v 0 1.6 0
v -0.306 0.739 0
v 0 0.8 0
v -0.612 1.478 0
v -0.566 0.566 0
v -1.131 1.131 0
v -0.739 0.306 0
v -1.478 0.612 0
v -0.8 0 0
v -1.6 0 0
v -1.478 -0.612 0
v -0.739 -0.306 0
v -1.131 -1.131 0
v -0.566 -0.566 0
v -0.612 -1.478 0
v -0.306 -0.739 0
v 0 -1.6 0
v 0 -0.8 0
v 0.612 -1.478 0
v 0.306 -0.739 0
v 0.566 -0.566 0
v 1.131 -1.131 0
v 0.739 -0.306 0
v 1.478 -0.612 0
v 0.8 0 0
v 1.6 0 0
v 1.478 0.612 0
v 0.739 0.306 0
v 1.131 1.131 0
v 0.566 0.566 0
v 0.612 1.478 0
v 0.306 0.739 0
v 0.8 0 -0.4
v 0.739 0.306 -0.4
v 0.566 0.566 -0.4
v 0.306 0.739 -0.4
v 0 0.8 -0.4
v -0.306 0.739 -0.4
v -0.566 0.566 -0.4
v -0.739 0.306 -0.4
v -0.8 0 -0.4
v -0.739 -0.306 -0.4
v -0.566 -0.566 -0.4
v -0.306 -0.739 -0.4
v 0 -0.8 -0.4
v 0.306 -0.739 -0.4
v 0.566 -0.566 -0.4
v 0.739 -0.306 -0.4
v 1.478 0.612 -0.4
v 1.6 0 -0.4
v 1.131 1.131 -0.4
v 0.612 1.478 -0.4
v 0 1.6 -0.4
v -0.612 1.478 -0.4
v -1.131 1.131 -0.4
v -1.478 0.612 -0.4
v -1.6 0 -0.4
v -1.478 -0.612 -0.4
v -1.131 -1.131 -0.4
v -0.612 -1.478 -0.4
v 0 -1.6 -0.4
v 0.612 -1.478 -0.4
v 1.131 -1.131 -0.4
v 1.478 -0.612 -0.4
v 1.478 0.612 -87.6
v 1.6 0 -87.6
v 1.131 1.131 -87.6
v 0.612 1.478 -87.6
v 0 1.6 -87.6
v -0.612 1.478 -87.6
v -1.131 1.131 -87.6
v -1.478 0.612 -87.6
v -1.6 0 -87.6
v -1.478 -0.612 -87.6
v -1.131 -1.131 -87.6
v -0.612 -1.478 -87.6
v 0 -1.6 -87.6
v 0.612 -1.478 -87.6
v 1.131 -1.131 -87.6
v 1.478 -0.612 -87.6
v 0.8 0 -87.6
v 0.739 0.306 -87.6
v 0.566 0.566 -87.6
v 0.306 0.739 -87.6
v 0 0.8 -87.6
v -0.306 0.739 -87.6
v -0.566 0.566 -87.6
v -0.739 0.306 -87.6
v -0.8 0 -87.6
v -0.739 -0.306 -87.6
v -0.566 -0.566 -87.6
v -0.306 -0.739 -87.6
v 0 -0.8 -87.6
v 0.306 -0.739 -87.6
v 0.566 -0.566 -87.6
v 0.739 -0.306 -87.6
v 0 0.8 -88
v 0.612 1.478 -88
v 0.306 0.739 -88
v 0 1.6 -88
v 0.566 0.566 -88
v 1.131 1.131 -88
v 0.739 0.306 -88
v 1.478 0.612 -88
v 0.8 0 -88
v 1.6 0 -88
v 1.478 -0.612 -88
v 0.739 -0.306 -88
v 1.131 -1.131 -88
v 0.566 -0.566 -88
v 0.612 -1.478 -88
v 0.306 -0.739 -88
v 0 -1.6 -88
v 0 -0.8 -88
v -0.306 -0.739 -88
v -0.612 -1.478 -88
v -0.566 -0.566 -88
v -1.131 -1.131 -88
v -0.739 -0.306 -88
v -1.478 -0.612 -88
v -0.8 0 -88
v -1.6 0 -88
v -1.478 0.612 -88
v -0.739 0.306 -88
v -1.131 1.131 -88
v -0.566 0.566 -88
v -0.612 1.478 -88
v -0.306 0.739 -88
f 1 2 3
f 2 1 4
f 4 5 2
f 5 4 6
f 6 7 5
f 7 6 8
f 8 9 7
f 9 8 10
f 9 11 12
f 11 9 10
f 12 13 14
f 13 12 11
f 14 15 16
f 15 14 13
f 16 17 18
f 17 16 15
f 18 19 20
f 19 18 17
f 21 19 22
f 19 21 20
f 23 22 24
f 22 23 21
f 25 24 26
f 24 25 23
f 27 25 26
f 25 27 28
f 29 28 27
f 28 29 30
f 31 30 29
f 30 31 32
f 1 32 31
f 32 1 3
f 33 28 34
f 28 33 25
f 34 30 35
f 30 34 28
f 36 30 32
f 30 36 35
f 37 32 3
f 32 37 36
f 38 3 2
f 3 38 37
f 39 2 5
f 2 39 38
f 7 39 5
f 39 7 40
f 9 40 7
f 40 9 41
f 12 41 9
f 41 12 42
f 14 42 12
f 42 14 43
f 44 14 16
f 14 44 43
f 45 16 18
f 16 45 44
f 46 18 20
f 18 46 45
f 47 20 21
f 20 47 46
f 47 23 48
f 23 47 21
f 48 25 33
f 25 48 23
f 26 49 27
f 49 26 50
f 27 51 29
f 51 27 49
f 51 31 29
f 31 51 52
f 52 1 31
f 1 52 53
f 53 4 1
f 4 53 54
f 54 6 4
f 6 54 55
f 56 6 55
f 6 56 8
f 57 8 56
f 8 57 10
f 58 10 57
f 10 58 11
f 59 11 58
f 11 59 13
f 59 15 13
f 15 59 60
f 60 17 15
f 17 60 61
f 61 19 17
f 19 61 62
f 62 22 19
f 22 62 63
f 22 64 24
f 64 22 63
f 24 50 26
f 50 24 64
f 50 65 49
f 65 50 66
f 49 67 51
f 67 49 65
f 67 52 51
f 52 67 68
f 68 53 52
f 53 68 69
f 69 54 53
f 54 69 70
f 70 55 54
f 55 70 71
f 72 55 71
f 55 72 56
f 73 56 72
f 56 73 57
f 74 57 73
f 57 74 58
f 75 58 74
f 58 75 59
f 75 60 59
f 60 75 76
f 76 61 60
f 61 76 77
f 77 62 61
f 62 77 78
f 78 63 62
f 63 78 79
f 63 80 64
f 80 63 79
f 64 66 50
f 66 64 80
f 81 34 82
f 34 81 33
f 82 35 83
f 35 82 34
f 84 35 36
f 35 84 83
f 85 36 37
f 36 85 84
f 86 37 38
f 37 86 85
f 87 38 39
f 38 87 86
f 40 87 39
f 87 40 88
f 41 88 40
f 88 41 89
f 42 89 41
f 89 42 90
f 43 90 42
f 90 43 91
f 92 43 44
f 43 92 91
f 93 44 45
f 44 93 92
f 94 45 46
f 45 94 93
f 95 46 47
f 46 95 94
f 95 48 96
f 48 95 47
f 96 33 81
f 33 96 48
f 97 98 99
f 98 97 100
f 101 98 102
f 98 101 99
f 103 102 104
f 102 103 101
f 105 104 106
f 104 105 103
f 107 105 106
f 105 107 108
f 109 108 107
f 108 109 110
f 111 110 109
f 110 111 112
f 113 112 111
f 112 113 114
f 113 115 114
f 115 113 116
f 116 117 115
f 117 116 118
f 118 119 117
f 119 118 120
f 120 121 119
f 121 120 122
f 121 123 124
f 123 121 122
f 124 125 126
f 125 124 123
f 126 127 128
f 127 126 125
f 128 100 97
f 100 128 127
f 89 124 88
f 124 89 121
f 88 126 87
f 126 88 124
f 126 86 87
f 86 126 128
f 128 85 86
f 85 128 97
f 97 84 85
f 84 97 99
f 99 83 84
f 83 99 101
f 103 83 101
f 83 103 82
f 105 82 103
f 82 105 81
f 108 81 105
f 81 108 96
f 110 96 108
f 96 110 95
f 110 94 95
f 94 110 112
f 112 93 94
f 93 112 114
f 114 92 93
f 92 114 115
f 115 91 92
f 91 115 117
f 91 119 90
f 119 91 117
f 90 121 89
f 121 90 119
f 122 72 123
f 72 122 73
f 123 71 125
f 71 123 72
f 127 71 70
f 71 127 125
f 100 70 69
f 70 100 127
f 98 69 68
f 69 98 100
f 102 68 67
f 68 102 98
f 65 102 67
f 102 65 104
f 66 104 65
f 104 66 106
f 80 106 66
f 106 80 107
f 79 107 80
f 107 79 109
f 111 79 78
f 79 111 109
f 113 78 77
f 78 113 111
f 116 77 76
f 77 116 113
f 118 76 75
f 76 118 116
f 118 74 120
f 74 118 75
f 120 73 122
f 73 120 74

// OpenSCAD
// file: ../p/4-4ring1.scad
use <../lib.scad>
function ldraw_lib__4_4ring1() = [
// 0 Ring  1 x 1.0
// 0 Name: 4-4ring1.dat
// 0 Author: James Jessiman
// 0 !LDRAW_ORG Primitive UPDATE 2009-01
// 0 !LICENSE Licensed under CC BY 2.0 and CC BY 4.0 : see CAreadme.txt
// 
// 0 BFC CERTIFY CCW
  [0,"BFC","CERTIFY"],
  [0,"BFC","CCW"],
// 
// 0 !HISTORY 1998-12-15 [PTadmin] Official Update 1998-10
// 0 !HISTORY 2002-04-08 [BrickCaster] Modified for BFC compliance
// 0 !HISTORY 2002-04-25 [PTadmin] Official Update 2002-02
// 0 !HISTORY 2007-06-24 [PTadmin] Header formatted for Contributor Agreement
// 0 !HISTORY 2008-07-01 [PTadmin] Official Update 2008-01
// 0 !HISTORY 2008-08-26 [cwdee] Switch polygon winding and rename
// 0 !HISTORY 2009-05-02 [PTadmin] Official Update 2009-01
// 
// 
// 4 16 -0.7654 0 1.8478 -0.3827 0 0.9239 0 0 1 0 0 2
  [4,16,-0.7654,0,1.8478,-0.3827,0,0.9239,0,0,1,0,0,2],
// 4 16 -1.4142 0 1.4142 -0.7071 0 0.7071 -0.3827 0 0.9239 -0.7654 0 1.8478
  [4,16,-1.4142,0,1.4142,-0.7071,0,0.7071,-0.3827,0,0.9239,-0.7654,0,1.8478],
// 4 16 -1.8478 0 0.7654 -0.9239 0 0.3827 -0.7071 0 0.7071 -1.4142 0 1.41420
  [4,16,-1.8478,0,0.7654,-0.9239,0,0.3827,-0.7071,0,0.7071,-1.4142,0,1.41420],
// 4 16 -2 0 0 -1 0 0 -0.9239 0 0.3827 -1.8478 0 0.7654
  [4,16,-2,0,0,-1,0,0,-0.9239,0,0.3827,-1.8478,0,0.7654],
// 4 16 -1.8478 0 -0.7654 -0.9239 0 -0.3827 -1 0 0 -2 0 0
  [4,16,-1.8478,0,-0.7654,-0.9239,0,-0.3827,-1,0,0,-2,0,0],
// 4 16 -1.4142 0 -1.4142 -0.7071 0 -0.7071 -0.9239 0 -0.3827 -1.8478 0 -0.7654
  [4,16,-1.4142,0,-1.4142,-0.7071,0,-0.7071,-0.9239,0,-0.3827,-1.8478,0,-0.7654],
// 4 16 -0.7654 0 -1.8478 -0.3827 0 -0.9239 -0.7071 0 -0.7071 -1.4142 0 -1.4142
  [4,16,-0.7654,0,-1.8478,-0.3827,0,-0.9239,-0.7071,0,-0.7071,-1.4142,0,-1.4142],
// 4 16 0 0 -2 0 0 -1 -0.3827 0 -0.9239 -0.7654 0 -1.8478
  [4,16,0,0,-2,0,0,-1,-0.3827,0,-0.9239,-0.7654,0,-1.8478],
// 4 16 0.7654 0 -1.8478 0.3827 0 -0.9239 0 0 -1 0 0 -2
  [4,16,0.7654,0,-1.8478,0.3827,0,-0.9239,0,0,-1,0,0,-2],
// 4 16 1.4142 0 -1.4142 0.7071 0 -0.7071 0.3827 0 -0.9239 0.7654 0 -1.8478
  [4,16,1.4142,0,-1.4142,0.7071,0,-0.7071,0.3827,0,-0.9239,0.7654,0,-1.8478],
// 4 16 1.8478 0 -0.7654 0.9239 0 -0.3827 0.7071 0 -0.7071 1.4142 0 -1.4142
  [4,16,1.8478,0,-0.7654,0.9239,0,-0.3827,0.7071,0,-0.7071,1.4142,0,-1.4142],
// 4 16 2 0 0 1 0 0 0.9239 0 -0.3827 1.8478 0 -0.7654
  [4,16,2,0,0,1,0,0,0.9239,0,-0.3827,1.8478,0,-0.7654],
// 4 16 1.8478 0 0.7654 0.9239 0 0.3827 1 0 0 2 0 0
  [4,16,1.8478,0,0.7654,0.9239,0,0.3827,1,0,0,2,0,0],
// 4 16 1.4142 0 1.4142 0.7071 0 0.7071 0.9239 0 0.3827 1.8478 0 0.7654
  [4,16,1.4142,0,1.4142,0.7071,0,0.7071,0.9239,0,0.3827,1.8478,0,0.7654],
// 4 16 0.7654 0 1.8478 0.3827 0 0.9239 0.7071 0 0.7071 1.4142 0 1.4142
  [4,16,0.7654,0,1.8478,0.3827,0,0.9239,0.7071,0,0.7071,1.4142,0,1.4142],
// 4 16 0 0 2 0 0 1 0.3827 0 0.9239 0.7654 0 1.8478
  [4,16,0,0,2,0,0,1,0.3827,0,0.9239,0.7654,0,1.8478],
// 0
];
module ldraw_lib__4_4ring1(step=0, col=false, unit=2/5, alt=false, line=0.2, solid=!$preview)
    makepoly(ldraw_lib__4_4ring1(), step=step, col=col, unit=unit, alt=alt, line=line, solid=solid);
ldraw_lib__4_4ring1(line=0.2);
// file: ../p/4-4edge.scad
use <../lib.scad>
function ldraw_lib__4_4edge() = [
// 0 Circle 1.0
// 0 Name: 4-4edge.dat
// 0 Author: James Jessiman
// 0 !LDRAW_ORG Primitive UPDATE 2017-01
// 0 !LICENSE Licensed under CC BY 4.0 : see CAreadme.txt
// 
// 0 BFC CERTIFY CCW
  [0,"BFC","CERTIFY"],
  [0,"BFC","CCW"],
// 
// 0 !HISTORY 1998-12-15 [PTadmin] Official Update 1998-10
// 0 !HISTORY 2005-12-28 [PTadmin] Official Update 2005-01
// 0 !HISTORY 2007-06-24 [PTadmin] Header formatted for Contributor Agreement
// 0 !HISTORY 2008-07-01 [PTadmin] Official Update 2008-01
// 0 !HISTORY 2017-01-15 [Steffen] BFCed
// 0 !HISTORY 2017-12-30 [PTadmin] Official Update 2017-01
// 
// 
// 2 24 1 0 0 0.9239 0 0.3827
  [2,24,1,0,0,0.9239,0,0.3827],
// 2 24 0.9239 0 0.3827 0.7071 0 0.7071
  [2,24,0.9239,0,0.3827,0.7071,0,0.7071],
// 2 24 0.7071 0 0.7071 0.3827 0 0.9239
  [2,24,0.7071,0,0.7071,0.3827,0,0.9239],
// 2 24 0.3827 0 0.9239 0 0 1
  [2,24,0.3827,0,0.9239,0,0,1],
// 2 24 0 0 1 -0.3827 0 0.9239
  [2,24,0,0,1,-0.3827,0,0.9239],
// 2 24 -0.3827 0 0.9239 -0.7071 0 0.7071
  [2,24,-0.3827,0,0.9239,-0.7071,0,0.7071],
// 2 24 -0.7071 0 0.7071 -0.9239 0 0.3827
  [2,24,-0.7071,0,0.7071,-0.9239,0,0.3827],
// 2 24 -0.9239 0 0.3827 -1 0 -0
  [2,24,-0.9239,0,0.3827,-1,0,-0],
// 2 24 -1 0 -0 -0.9239 0 -0.3827
  [2,24,-1,0,-0,-0.9239,0,-0.3827],
// 2 24 -0.9239 0 -0.3827 -0.7071 0 -0.7071
  [2,24,-0.9239,0,-0.3827,-0.7071,0,-0.7071],
// 2 24 -0.7071 0 -0.7071 -0.3827 0 -0.9239
  [2,24,-0.7071,0,-0.7071,-0.3827,0,-0.9239],
// 2 24 -0.3827 0 -0.9239 0 0 -1
  [2,24,-0.3827,0,-0.9239,0,0,-1],
// 2 24 0 0 -1 0.3827 0 -0.9239
  [2,24,0,0,-1,0.3827,0,-0.9239],
// 2 24 0.3827 0 -0.9239 0.7071 0 -0.7071
  [2,24,0.3827,0,-0.9239,0.7071,0,-0.7071],
// 2 24 0.7071 0 -0.7071 0.9239 0 -0.3827
  [2,24,0.7071,0,-0.7071,0.9239,0,-0.3827],
// 2 24 0.9239 0 -0.3827 1 0 0
  [2,24,0.9239,0,-0.3827,1,0,0],
];
module ldraw_lib__4_4edge(step=0, col=false, unit=2/5, alt=false, line=0.2, solid=!$preview)
    makepoly(ldraw_lib__4_4edge(), step=step, col=col, unit=unit, alt=alt, line=line, solid=solid);
ldraw_lib__4_4edge(line=0.2);
// file: ../p/4-4cyli.scad
use <../lib.scad>
function ldraw_lib__4_4cyli() = [
// 0 Cylinder 1.0
// 0 Name: 4-4cyli.dat
// 0 Author: James Jessiman
// 0 !LDRAW_ORG Primitive UPDATE 2005-01
// 0 !LICENSE Licensed under CC BY 2.0 and CC BY 4.0 : see CAreadme.txt
// 
// 0 BFC CERTIFY CCW
  [0,"BFC","CERTIFY"],
  [0,"BFC","CCW"],
// 
// 0 !HISTORY 1998-12-15 [PTadmin] Official Update 1998-10
// 0 !HISTORY 2002-03-23 [sbliss] Added BFC statement; merged headers from files in distributions LDraw 0.27 and Complete.
// 0 !HISTORY 2002-04-25 [PTadmin] Official Update 2002-02
// 0 !HISTORY 2004-12-14 [guyvivan] BFC CCW
// 0 !HISTORY 2005-12-28 [PTadmin] Official Update 2005-01
// 0 !HISTORY 2007-06-24 [PTadmin] Header formatted for Contributor Agreement
// 0 !HISTORY 2008-07-01 [PTadmin] Official Update 2008-01
// 
// 
// 4 16 1 1 0 0.9239 1 0.3827 0.9239 0 0.3827 1 0 0
  [4,16,1,1,0,0.9239,1,0.3827,0.9239,0,0.3827,1,0,0],
// 5 24 1 0 0 1 1 0 0.9239 0 0.3827 0.9239 0 -0.3827
  [5,24,1,0,0,1,1,0,0.9239,0,0.3827,0.9239,0,-0.3827],
// 4 16 0.9239 1 0.3827 0.7071 1 0.7071 0.7071 0 0.7071 0.9239 0 0.3827
  [4,16,0.9239,1,0.3827,0.7071,1,0.7071,0.7071,0,0.7071,0.9239,0,0.3827],
// 5 24 0.9239 0 0.3827 0.9239 1 0.3827 0.7071 0 0.7071 1 0 0
  [5,24,0.9239,0,0.3827,0.9239,1,0.3827,0.7071,0,0.7071,1,0,0],
// 4 16 0.7071 1 0.7071 0.3827 1 0.9239 0.3827 0 0.9239 0.7071 0 0.7071
  [4,16,0.7071,1,0.7071,0.3827,1,0.9239,0.3827,0,0.9239,0.7071,0,0.7071],
// 5 24 0.7071 0 0.7071 0.7071 1 0.7071 0.3827 0 0.9239 0.9239 0 0.3827
  [5,24,0.7071,0,0.7071,0.7071,1,0.7071,0.3827,0,0.9239,0.9239,0,0.3827],
// 4 16 0.3827 1 0.9239 0 1 1 0 0 1 0.3827 0 0.9239
  [4,16,0.3827,1,0.9239,0,1,1,0,0,1,0.3827,0,0.9239],
// 5 24 0.3827 0 0.9239 0.3827 1 0.9239 0 0 1 0.7071 0 0.7071
  [5,24,0.3827,0,0.9239,0.3827,1,0.9239,0,0,1,0.7071,0,0.7071],
// 4 16 0 1 1 -0.3827 1 0.9239 -0.3827 0 0.9239 0 0 1
  [4,16,0,1,1,-0.3827,1,0.9239,-0.3827,0,0.9239,0,0,1],
// 5 24 0 0 1 0 1 1 -0.3827 0 0.9239 0.3827 0 0.9239
  [5,24,0,0,1,0,1,1,-0.3827,0,0.9239,0.3827,0,0.9239],
// 4 16 -0.3827 1 0.9239 -0.7071 1 0.7071 -0.7071 0 0.7071 -0.3827 0 0.9239
  [4,16,-0.3827,1,0.9239,-0.7071,1,0.7071,-0.7071,0,0.7071,-0.3827,0,0.9239],
// 5 24 -0.3827 0 0.9239 -0.3827 1 0.9239 -0.7071 0 0.7071 0 0 1
  [5,24,-0.3827,0,0.9239,-0.3827,1,0.9239,-0.7071,0,0.7071,0,0,1],
// 4 16 -0.7071 1 0.7071 -0.9239 1 0.3827 -0.9239 0 0.3827 -0.7071 0 0.7071
  [4,16,-0.7071,1,0.7071,-0.9239,1,0.3827,-0.9239,0,0.3827,-0.7071,0,0.7071],
// 5 24 -0.7071 0 0.7071 -0.7071 1 0.7071 -0.9239 0 0.3827 -0.3827 0 0.9239
  [5,24,-0.7071,0,0.7071,-0.7071,1,0.7071,-0.9239,0,0.3827,-0.3827,0,0.9239],
// 4 16 -0.9239 1 0.3827 -1 1 0 -1 0 0 -0.9239 0 0.3827
  [4,16,-0.9239,1,0.3827,-1,1,0,-1,0,0,-0.9239,0,0.3827],
// 5 24 -0.9239 0 0.3827 -0.9239 1 0.3827 -1 0 0 -0.7071 0 0.7071
  [5,24,-0.9239,0,0.3827,-0.9239,1,0.3827,-1,0,0,-0.7071,0,0.7071],
// 4 16 -1 1 0 -0.9239 1 -0.3827 -0.9239 0 -0.3827 -1 0 0
  [4,16,-1,1,0,-0.9239,1,-0.3827,-0.9239,0,-0.3827,-1,0,0],
// 5 24 -1 0 0 -1 1 0 -0.9239 0 -0.3827 -0.9239 0 0.3827
  [5,24,-1,0,0,-1,1,0,-0.9239,0,-0.3827,-0.9239,0,0.3827],
// 4 16 -0.9239 1 -0.3827 -0.7071 1 -0.7071 -0.7071 0 -0.7071 -0.9239 0 -0.3827
  [4,16,-0.9239,1,-0.3827,-0.7071,1,-0.7071,-0.7071,0,-0.7071,-0.9239,0,-0.3827],
// 5 24 -0.9239 0 -0.3827 -0.9239 1 -0.3827 -0.7071 0 -0.7071 -1 0 0
  [5,24,-0.9239,0,-0.3827,-0.9239,1,-0.3827,-0.7071,0,-0.7071,-1,0,0],
// 4 16 -0.7071 1 -0.7071 -0.3827 1 -0.9239 -0.3827 0 -0.9239 -0.7071 0 -0.7071
  [4,16,-0.7071,1,-0.7071,-0.3827,1,-0.9239,-0.3827,0,-0.9239,-0.7071,0,-0.7071],
// 5 24 -0.7071 0 -0.7071 -0.7071 1 -0.7071 -0.3827 0 -0.9239 -0.9239 0 -0.3827
  [5,24,-0.7071,0,-0.7071,-0.7071,1,-0.7071,-0.3827,0,-0.9239,-0.9239,0,-0.3827],
// 4 16 -0.3827 1 -0.9239 0 1 -1 0 0 -1 -0.3827 0 -0.9239
  [4,16,-0.3827,1,-0.9239,0,1,-1,0,0,-1,-0.3827,0,-0.9239],
// 5 24 -0.3827 0 -0.9239 -0.3827 1 -0.9239 0 0 -1 -0.7071 0 -0.7071
  [5,24,-0.3827,0,-0.9239,-0.3827,1,-0.9239,0,0,-1,-0.7071,0,-0.7071],
// 4 16 0 1 -1 0.3827 1 -0.9239 0.3827 0 -0.9239 0 0 -1
  [4,16,0,1,-1,0.3827,1,-0.9239,0.3827,0,-0.9239,0,0,-1],
// 5 24 0 0 -1 0 1 -1 0.3827 0 -0.9239 -0.3827 0 -0.9239
  [5,24,0,0,-1,0,1,-1,0.3827,0,-0.9239,-0.3827,0,-0.9239],
// 4 16 0.3827 1 -0.9239 0.7071 1 -0.7071 0.7071 0 -0.7071 0.3827 0 -0.9239
  [4,16,0.3827,1,-0.9239,0.7071,1,-0.7071,0.7071,0,-0.7071,0.3827,0,-0.9239],
// 5 24 0.3827 0 -0.9239 0.3827 1 -0.9239 0.7071 0 -0.7071 0 0 -1
  [5,24,0.3827,0,-0.9239,0.3827,1,-0.9239,0.7071,0,-0.7071,0,0,-1],
// 4 16 0.7071 1 -0.7071 0.9239 1 -0.3827 0.9239 0 -0.3827 0.7071 0 -0.7071
  [4,16,0.7071,1,-0.7071,0.9239,1,-0.3827,0.9239,0,-0.3827,0.7071,0,-0.7071],
// 5 24 0.7071 0 -0.7071 0.7071 1 -0.7071 0.9239 0 -0.3827 0.3827 0 -0.9239
  [5,24,0.7071,0,-0.7071,0.7071,1,-0.7071,0.9239,0,-0.3827,0.3827,0,-0.9239],
// 4 16 0.9239 1 -0.3827 1 1 0 1 0 0 0.9239 0 -0.3827
  [4,16,0.9239,1,-0.3827,1,1,0,1,0,0,0.9239,0,-0.3827],
// 5 24 0.9239 0 -0.3827 0.9239 1 -0.3827 1 0 0 0.7071 0 -0.7071
  [5,24,0.9239,0,-0.3827,0.9239,1,-0.3827,1,0,0,0.7071,0,-0.7071],
// 0
];
module ldraw_lib__4_4cyli(step=0, col=false, unit=2/5, alt=false, line=0.2, solid=!$preview)
    makepoly(ldraw_lib__4_4cyli(), step=step, col=col, unit=unit, alt=alt, line=line, solid=solid);
ldraw_lib__4_4cyli(line=0.2);
// file: u9053.scad
use <../lib.scad>
use <../p/4-4cyli.scad>
use <../p/4-4edge.scad>
use <../p/4-4ring1.scad>
function ldraw_lib__u9053() = [
// 0 ~Technic Flex-System Hose End
// 0 Name: u9053.dat
// 0 Author: William Howard [WilliamH]
// 0 !LDRAW_ORG Part UPDATE 2011-02
// 0 !LICENSE Licensed under CC BY 2.0 and CC BY 4.0 : see CAreadme.txt
// 
// 0 BFC CERTIFY CCW
  [0,"BFC","CERTIFY"],
  [0,"BFC","CCW"],
// 
// 0 !HISTORY 2011-12-21 [cwdee] Reworked subparting technique
// 0 !HISTORY 2011-12-23 [PTadmin] Renamed from 76
// 0 !HISTORY 2011-12-29 [PTadmin] Official Update 2011-02
// 
// 
// 1 16 0 0 0 2 0 0 0 1 0 0 0 2 4-4ring1.dat
  [1,16,0,0,0,2,0,0,0,1,0,0,0,2, ldraw_lib__4_4ring1()],
// 1 16 0 0 0 2 0 0 0 1 0 0 0 2 4-4edge.dat
  [1,16,0,0,0,2,0,0,0,1,0,0,0,2, ldraw_lib__4_4edge()],
// 0 BFC INVERTNEXT
  [0,"BFC","INVERTNEXT"],
// 1 16 0 0 0 2 0 0 0 1 0 0 0 2 4-4cyli.dat
  [1,16,0,0,0,2,0,0,0,1,0,0,0,2, ldraw_lib__4_4cyli()],
// 1 16 0 0 0 4 0 0 0 1 0 0 0 4 4-4edge.dat
  [1,16,0,0,0,4,0,0,0,1,0,0,0,4, ldraw_lib__4_4edge()],
// 1 16 0 0 0 4 0 0 0 1 0 0 0 4 4-4cyli.dat
  [1,16,0,0,0,4,0,0,0,1,0,0,0,4, ldraw_lib__4_4cyli()],
// 0
];
module ldraw_lib__u9053(step=0, col=false, unit=2/5, alt=false, line=0.2, solid=!$preview)
    makepoly(ldraw_lib__u9053(), step=step, col=col, unit=unit, alt=alt, line=line, solid=solid);
ldraw_lib__u9053(line=0.2);
// file: 77.scad
use <../lib.scad>
use <../p/4-4cyli.scad>
function ldraw_lib__77() = [
// 0 ~Technic Flex-System Hose Segment
// 0 Name: 77.dat
// 0 Author: William Howard [WilliamH]
// 0 !LDRAW_ORG Part UPDATE 2011-02
// 0 !LICENSE Licensed under CC BY 2.0 and CC BY 4.0 : see CAreadme.txt
// 
// 0 BFC CERTIFY CCW
  [0,"BFC","CERTIFY"],
  [0,"BFC","CCW"],
// 
// 0 !HISTORY 2011-12-21 [cwdee] Reworked subparting technique
// 0 !HISTORY 2011-12-29 [PTadmin] Official Update 2011-02
// 
// 
// 1 16 0 0 0 4 0 0 0 1 0 0 0 4 4-4cyli.dat
  [1,16,0,0,0,4,0,0,0,1,0,0,0,4, ldraw_lib__4_4cyli()],
// 0 BFC INVERTNEXT
  [0,"BFC","INVERTNEXT"],
// 1 16 0 0 0 2 0 0 0 1 0 0 0 2 4-4cyli.dat
  [1,16,0,0,0,2,0,0,0,1,0,0,0,2, ldraw_lib__4_4cyli()],
// 0
];
module ldraw_lib__77(step=0, col=false, unit=2/5, alt=false, line=0.2, solid=!$preview)
    makepoly(ldraw_lib__77(), step=step, col=col, unit=unit, alt=alt, line=line, solid=solid);
ldraw_lib__77(line=0.2);
// main file
use <../lib.scad>
use <77.scad>
use <u9053.scad>
function ldraw_lib__71505() = [
// 0 Technic Flex-System Hose 11L (220LDU)
// 0 Name: 71505.dat
// 0 Author: Tim Gould [timgould]
// 0 !LDRAW_ORG Part UPDATE 2011-02
// 0 !LICENSE Licensed under CC BY 4.0 : see CAreadme.txt
// 
// 0 BFC CERTIFY CCW
  [0,"BFC","CERTIFY"],
  [0,"BFC","CCW"],
// 
// 0 !KEYWORDS bar, tube
// 
// 0 !HISTORY 2011-12-29 [PTadmin] Official Update 2011-02
// 
// 
// 1 16 0 0 0 1 0 0 0 1 0 0 0 1 u9053.dat
  [1,16,0,0,0,1,0,0,0,1,0,0,0,1, ldraw_lib__u9053()],
// 1 16 0 1 0 1 0 0 0 218 0 0 0 1 77.dat
  [1,16,0,1,0,1,0,0,0,218,0,0,0,1, ldraw_lib__77()],
// 1 16 0 220 0 -1 0 0 0 -1 0 0 0 1 u9053.dat
  [1,16,0,220,0,-1,0,0,0,-1,0,0,0,1, ldraw_lib__u9053()],
];
module ldraw_lib__71505(step=0, col=false, unit=2/5, alt=false, line=0.2, solid=!$preview)
    makepoly(ldraw_lib__71505(), step=step, col=col, unit=unit, alt=alt, line=line, solid=solid);
ldraw_lib__71505(line=0.2);
